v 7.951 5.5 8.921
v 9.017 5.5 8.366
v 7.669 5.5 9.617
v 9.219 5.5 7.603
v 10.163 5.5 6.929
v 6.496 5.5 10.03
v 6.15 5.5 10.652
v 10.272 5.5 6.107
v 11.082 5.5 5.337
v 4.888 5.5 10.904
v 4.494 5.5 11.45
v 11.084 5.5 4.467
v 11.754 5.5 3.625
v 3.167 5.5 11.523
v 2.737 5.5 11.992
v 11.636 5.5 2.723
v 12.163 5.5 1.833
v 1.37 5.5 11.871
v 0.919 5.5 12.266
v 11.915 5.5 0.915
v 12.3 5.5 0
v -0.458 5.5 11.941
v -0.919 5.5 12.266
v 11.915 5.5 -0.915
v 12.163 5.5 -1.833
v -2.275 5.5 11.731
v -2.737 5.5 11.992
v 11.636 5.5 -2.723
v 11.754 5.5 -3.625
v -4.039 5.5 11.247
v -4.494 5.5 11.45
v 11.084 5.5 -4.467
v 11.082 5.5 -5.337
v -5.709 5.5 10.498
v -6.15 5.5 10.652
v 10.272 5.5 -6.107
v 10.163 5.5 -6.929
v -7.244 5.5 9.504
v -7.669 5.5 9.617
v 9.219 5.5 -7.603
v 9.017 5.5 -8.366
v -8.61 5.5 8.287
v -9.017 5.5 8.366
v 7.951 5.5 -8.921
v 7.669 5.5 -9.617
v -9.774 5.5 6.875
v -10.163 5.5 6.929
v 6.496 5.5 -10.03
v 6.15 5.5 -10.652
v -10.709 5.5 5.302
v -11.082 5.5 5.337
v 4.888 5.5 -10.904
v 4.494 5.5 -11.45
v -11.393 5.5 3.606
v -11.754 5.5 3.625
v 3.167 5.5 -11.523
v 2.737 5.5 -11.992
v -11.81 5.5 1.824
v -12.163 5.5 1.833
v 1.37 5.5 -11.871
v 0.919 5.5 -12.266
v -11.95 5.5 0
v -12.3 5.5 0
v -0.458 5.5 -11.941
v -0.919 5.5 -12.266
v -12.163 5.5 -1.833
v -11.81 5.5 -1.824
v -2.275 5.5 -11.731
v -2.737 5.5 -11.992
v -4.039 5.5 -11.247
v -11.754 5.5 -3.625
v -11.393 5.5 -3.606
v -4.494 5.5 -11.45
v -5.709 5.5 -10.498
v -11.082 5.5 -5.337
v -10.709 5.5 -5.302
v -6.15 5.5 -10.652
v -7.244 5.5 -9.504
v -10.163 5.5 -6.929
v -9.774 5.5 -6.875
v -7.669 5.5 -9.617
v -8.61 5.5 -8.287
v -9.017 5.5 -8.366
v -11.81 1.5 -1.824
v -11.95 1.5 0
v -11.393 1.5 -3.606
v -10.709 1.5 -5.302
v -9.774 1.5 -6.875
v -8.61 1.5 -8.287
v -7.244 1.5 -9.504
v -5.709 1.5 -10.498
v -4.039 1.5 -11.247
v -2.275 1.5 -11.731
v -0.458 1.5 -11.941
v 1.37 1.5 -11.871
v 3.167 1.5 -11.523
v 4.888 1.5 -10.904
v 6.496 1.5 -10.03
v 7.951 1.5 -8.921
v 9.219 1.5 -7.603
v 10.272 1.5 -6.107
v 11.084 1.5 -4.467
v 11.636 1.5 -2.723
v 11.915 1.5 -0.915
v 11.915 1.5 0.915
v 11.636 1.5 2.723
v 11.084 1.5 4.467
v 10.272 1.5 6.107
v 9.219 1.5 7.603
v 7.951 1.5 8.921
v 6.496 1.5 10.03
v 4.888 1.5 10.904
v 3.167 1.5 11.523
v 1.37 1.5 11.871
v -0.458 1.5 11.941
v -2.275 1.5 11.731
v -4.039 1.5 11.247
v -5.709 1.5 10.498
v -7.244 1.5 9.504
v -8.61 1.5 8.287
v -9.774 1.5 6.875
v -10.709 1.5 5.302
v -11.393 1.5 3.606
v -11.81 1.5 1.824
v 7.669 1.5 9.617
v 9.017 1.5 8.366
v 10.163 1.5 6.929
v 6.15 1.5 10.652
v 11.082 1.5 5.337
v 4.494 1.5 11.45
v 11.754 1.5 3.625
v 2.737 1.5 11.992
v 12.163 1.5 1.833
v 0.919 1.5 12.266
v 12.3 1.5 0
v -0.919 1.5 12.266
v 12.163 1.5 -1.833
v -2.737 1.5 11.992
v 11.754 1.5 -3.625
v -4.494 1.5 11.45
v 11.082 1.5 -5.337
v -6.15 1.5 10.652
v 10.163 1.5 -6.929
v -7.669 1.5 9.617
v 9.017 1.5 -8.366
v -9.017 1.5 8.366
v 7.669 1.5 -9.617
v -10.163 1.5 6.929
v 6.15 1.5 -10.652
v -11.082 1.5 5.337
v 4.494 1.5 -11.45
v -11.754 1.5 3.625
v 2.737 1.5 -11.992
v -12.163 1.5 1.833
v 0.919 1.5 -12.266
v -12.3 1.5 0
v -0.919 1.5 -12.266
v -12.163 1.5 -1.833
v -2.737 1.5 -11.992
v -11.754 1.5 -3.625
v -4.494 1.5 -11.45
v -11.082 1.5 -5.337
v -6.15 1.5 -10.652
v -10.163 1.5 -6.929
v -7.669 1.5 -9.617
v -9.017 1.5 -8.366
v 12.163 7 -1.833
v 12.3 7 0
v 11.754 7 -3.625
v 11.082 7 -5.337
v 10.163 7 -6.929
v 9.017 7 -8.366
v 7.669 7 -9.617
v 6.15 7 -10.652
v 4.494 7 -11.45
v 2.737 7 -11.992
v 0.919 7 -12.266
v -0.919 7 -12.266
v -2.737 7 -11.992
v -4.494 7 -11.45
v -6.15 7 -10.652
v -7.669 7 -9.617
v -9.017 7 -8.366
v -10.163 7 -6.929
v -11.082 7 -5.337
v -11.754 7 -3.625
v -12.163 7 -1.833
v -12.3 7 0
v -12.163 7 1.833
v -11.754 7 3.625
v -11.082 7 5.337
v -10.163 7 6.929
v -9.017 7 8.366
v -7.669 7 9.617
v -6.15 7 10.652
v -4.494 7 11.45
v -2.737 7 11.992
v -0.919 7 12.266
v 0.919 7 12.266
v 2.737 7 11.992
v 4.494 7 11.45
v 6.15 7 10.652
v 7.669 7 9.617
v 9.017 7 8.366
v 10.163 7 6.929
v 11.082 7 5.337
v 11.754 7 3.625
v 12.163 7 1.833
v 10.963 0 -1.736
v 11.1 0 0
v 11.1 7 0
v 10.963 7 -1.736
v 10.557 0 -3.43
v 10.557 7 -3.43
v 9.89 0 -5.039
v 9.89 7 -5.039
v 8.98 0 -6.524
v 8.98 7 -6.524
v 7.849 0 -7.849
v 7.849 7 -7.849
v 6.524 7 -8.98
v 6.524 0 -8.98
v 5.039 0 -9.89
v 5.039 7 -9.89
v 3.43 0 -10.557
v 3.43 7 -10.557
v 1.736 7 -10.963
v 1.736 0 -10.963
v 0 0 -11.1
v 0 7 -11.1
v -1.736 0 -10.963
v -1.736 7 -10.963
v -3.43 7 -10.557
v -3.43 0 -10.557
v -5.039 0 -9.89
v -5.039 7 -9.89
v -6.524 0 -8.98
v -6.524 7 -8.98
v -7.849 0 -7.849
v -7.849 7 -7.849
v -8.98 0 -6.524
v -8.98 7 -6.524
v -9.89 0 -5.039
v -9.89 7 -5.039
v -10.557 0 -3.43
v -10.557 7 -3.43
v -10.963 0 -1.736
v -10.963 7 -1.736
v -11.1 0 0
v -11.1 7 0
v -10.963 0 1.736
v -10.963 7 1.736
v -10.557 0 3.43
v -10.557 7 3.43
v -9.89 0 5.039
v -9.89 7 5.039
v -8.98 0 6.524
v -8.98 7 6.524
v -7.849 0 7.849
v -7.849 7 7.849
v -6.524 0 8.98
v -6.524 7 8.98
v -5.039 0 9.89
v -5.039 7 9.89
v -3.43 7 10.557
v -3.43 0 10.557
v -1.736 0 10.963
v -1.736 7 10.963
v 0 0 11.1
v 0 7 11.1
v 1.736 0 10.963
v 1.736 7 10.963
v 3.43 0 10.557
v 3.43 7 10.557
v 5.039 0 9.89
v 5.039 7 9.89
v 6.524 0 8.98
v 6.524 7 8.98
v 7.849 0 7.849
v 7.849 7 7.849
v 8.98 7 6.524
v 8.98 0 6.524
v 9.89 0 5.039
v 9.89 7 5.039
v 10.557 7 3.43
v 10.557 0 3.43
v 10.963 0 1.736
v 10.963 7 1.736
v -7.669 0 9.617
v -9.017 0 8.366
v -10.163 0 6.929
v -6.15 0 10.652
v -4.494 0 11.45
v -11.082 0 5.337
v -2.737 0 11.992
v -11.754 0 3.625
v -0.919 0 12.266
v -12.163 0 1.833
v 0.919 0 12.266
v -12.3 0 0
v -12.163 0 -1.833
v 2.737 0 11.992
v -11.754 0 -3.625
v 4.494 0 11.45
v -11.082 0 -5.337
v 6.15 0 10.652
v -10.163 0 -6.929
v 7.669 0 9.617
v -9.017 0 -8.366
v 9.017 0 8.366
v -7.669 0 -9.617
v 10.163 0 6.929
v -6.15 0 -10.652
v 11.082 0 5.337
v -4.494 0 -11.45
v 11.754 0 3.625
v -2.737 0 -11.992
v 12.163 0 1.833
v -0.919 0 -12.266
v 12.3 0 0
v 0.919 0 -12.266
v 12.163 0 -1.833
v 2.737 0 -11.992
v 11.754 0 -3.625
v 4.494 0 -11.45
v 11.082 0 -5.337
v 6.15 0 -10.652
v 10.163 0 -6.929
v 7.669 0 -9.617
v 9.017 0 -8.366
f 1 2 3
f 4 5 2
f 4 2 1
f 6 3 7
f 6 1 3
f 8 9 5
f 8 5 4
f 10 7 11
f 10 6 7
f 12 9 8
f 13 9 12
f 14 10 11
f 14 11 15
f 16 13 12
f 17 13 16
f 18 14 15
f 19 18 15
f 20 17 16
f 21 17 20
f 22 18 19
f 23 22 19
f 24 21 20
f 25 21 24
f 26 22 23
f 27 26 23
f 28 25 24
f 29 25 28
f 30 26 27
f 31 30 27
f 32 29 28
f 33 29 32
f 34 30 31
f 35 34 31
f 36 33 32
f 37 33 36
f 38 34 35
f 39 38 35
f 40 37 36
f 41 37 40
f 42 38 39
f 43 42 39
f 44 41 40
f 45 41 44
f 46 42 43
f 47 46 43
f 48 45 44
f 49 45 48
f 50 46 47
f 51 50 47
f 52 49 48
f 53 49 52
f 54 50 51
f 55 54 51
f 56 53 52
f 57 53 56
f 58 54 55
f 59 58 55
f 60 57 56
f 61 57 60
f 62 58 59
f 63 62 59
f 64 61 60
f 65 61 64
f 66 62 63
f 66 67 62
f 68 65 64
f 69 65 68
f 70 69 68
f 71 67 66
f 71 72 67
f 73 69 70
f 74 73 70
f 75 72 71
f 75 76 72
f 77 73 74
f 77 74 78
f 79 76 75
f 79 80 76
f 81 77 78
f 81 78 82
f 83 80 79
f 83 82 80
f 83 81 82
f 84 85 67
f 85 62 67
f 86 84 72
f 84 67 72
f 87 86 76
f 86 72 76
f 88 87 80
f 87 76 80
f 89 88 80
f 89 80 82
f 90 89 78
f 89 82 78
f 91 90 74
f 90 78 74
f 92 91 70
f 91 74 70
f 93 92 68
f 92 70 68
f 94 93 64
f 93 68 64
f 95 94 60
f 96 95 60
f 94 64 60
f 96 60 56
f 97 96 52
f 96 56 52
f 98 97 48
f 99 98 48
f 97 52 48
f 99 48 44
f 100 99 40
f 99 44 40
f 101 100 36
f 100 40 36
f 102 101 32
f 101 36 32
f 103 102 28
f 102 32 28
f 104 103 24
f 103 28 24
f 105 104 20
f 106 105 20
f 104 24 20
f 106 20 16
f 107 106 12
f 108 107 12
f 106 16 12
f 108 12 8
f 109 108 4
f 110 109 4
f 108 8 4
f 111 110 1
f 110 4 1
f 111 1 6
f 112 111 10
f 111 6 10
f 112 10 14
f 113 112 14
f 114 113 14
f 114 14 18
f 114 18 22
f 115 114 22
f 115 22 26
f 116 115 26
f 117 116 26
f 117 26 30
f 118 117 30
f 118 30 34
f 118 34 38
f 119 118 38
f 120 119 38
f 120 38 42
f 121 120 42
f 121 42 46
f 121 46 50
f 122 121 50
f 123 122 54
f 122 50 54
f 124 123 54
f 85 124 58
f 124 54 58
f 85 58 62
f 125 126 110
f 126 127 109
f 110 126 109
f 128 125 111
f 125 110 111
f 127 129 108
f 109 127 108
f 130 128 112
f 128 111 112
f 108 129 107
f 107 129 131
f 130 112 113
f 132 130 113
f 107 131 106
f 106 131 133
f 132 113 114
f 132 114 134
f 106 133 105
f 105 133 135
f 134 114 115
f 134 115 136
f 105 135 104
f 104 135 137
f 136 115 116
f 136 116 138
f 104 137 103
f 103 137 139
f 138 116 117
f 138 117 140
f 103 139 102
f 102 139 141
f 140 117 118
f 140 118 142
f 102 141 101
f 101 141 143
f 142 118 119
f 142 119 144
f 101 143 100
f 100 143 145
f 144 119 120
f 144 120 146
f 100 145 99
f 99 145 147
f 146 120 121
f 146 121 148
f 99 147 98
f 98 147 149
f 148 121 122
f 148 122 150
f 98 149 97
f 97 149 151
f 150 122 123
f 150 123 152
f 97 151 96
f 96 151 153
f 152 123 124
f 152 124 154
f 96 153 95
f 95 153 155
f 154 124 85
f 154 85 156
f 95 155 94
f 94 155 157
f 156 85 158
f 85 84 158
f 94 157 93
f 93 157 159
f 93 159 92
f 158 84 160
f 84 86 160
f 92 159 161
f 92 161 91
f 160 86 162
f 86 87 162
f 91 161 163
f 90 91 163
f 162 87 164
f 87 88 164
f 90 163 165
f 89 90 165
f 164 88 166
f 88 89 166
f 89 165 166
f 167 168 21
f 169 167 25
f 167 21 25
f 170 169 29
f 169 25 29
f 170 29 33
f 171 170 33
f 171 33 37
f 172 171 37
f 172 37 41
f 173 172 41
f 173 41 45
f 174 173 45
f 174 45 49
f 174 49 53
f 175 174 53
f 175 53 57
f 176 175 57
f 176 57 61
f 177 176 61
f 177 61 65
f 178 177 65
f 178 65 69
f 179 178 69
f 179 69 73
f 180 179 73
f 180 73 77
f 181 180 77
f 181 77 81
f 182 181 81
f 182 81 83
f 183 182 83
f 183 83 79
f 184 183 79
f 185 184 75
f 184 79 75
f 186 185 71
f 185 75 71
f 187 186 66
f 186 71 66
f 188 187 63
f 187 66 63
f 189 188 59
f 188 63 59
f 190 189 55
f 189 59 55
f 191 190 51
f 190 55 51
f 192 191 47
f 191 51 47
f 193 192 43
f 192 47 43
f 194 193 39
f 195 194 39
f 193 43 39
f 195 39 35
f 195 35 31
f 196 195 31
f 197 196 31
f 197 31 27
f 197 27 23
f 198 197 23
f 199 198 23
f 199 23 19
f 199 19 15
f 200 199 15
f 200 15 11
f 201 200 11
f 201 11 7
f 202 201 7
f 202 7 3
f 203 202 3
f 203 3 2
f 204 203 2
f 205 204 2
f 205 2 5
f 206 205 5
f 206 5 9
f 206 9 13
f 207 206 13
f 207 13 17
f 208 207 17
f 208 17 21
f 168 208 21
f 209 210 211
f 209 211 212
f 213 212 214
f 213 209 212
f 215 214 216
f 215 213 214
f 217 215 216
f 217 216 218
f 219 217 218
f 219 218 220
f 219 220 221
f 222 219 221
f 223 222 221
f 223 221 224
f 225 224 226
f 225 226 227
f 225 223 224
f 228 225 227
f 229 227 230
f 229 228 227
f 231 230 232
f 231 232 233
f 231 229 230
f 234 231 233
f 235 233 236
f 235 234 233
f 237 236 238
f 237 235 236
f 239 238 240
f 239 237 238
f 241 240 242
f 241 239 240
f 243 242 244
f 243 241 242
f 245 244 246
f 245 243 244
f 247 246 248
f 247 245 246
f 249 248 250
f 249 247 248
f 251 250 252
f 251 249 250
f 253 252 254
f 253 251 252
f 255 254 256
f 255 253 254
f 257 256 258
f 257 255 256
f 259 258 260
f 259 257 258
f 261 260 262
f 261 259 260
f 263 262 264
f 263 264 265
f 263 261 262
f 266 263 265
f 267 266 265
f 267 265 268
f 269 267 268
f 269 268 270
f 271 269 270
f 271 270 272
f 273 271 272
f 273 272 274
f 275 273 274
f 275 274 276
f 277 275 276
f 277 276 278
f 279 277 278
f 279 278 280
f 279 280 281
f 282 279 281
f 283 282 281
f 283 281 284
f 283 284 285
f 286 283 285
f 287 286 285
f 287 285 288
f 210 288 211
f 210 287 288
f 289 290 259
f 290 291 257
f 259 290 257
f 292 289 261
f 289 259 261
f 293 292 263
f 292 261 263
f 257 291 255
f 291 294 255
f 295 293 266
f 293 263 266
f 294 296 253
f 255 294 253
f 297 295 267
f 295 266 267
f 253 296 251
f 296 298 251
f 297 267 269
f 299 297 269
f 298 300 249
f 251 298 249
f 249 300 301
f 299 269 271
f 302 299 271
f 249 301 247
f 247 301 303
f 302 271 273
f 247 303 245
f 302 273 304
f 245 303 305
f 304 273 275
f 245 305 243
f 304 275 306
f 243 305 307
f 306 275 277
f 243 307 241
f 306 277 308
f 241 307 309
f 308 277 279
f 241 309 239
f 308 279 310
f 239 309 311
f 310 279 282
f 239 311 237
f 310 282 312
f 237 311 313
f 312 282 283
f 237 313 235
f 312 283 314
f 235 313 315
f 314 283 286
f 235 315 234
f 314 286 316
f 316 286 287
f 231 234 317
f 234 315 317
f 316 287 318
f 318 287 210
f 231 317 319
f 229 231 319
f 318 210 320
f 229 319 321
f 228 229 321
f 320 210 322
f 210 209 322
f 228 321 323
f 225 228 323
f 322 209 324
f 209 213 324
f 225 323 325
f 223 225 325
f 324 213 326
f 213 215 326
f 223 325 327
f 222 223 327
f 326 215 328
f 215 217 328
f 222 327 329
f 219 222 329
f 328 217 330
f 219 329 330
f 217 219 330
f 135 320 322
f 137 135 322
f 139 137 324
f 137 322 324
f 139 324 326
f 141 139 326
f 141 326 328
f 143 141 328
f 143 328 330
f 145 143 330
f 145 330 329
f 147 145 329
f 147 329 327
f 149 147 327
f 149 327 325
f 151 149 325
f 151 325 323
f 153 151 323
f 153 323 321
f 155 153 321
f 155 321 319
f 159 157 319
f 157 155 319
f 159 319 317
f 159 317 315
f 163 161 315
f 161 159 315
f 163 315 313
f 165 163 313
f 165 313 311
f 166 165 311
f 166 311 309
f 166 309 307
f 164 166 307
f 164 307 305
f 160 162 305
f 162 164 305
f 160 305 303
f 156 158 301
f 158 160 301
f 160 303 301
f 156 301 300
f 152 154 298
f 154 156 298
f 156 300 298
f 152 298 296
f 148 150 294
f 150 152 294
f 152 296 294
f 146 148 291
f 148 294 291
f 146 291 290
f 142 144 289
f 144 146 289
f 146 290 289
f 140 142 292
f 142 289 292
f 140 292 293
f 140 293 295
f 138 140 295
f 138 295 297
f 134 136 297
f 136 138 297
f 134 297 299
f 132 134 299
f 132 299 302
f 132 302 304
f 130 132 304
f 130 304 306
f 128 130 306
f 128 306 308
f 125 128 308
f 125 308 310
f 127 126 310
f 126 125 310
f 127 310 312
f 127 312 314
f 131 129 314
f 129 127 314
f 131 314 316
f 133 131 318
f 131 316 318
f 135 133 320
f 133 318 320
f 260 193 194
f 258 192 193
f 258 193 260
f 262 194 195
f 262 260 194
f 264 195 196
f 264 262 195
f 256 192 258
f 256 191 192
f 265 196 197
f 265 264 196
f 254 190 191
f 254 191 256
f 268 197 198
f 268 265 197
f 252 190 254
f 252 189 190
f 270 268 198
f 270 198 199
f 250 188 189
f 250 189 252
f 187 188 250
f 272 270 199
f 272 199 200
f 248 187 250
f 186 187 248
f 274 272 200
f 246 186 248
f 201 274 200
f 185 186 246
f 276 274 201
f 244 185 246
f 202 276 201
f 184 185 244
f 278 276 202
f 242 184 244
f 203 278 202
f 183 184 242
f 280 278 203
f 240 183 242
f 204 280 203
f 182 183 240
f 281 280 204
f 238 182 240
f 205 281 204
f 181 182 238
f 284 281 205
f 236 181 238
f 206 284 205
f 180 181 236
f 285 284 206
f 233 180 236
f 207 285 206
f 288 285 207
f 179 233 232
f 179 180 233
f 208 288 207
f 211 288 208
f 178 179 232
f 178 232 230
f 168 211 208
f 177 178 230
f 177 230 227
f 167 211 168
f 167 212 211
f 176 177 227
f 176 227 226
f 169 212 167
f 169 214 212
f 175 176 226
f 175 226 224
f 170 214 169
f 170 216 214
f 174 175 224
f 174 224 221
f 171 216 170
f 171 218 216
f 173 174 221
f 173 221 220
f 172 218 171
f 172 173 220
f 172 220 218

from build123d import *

# Parameters (mm, degrees)
SKETCH1_R           = 12.3
SKETCH1_R_2         = 11.1
BOSS_EXTRUDE1_DEPTH = 7
SKETCH2_W           = 0.35
SKETCH2_H           = 4


with BuildPart() as part:
    # Sketch1 → Boss-Extrude1 (new body)
    with BuildSketch(Plane(origin=(0, 0, 0), x_dir=(1, 0, 0), z_dir=(0, 1, 0))):
        Circle(SKETCH1_R)
        Circle(SKETCH1_R_2, mode=Mode.SUBTRACT)
    extrude(amount=BOSS_EXTRUDE1_DEPTH)

    # Sketch2 → Cut-Revolve1 (revolve, cut)
    with BuildSketch(Plane.XY):
        with Locations((-12.125, 3.5)):
            Rectangle(SKETCH2_W, SKETCH2_H)
    revolve(axis=Axis((0, 7, 0), (0, -1, 0)), mode=Mode.SUBTRACT)


solid = part.part
